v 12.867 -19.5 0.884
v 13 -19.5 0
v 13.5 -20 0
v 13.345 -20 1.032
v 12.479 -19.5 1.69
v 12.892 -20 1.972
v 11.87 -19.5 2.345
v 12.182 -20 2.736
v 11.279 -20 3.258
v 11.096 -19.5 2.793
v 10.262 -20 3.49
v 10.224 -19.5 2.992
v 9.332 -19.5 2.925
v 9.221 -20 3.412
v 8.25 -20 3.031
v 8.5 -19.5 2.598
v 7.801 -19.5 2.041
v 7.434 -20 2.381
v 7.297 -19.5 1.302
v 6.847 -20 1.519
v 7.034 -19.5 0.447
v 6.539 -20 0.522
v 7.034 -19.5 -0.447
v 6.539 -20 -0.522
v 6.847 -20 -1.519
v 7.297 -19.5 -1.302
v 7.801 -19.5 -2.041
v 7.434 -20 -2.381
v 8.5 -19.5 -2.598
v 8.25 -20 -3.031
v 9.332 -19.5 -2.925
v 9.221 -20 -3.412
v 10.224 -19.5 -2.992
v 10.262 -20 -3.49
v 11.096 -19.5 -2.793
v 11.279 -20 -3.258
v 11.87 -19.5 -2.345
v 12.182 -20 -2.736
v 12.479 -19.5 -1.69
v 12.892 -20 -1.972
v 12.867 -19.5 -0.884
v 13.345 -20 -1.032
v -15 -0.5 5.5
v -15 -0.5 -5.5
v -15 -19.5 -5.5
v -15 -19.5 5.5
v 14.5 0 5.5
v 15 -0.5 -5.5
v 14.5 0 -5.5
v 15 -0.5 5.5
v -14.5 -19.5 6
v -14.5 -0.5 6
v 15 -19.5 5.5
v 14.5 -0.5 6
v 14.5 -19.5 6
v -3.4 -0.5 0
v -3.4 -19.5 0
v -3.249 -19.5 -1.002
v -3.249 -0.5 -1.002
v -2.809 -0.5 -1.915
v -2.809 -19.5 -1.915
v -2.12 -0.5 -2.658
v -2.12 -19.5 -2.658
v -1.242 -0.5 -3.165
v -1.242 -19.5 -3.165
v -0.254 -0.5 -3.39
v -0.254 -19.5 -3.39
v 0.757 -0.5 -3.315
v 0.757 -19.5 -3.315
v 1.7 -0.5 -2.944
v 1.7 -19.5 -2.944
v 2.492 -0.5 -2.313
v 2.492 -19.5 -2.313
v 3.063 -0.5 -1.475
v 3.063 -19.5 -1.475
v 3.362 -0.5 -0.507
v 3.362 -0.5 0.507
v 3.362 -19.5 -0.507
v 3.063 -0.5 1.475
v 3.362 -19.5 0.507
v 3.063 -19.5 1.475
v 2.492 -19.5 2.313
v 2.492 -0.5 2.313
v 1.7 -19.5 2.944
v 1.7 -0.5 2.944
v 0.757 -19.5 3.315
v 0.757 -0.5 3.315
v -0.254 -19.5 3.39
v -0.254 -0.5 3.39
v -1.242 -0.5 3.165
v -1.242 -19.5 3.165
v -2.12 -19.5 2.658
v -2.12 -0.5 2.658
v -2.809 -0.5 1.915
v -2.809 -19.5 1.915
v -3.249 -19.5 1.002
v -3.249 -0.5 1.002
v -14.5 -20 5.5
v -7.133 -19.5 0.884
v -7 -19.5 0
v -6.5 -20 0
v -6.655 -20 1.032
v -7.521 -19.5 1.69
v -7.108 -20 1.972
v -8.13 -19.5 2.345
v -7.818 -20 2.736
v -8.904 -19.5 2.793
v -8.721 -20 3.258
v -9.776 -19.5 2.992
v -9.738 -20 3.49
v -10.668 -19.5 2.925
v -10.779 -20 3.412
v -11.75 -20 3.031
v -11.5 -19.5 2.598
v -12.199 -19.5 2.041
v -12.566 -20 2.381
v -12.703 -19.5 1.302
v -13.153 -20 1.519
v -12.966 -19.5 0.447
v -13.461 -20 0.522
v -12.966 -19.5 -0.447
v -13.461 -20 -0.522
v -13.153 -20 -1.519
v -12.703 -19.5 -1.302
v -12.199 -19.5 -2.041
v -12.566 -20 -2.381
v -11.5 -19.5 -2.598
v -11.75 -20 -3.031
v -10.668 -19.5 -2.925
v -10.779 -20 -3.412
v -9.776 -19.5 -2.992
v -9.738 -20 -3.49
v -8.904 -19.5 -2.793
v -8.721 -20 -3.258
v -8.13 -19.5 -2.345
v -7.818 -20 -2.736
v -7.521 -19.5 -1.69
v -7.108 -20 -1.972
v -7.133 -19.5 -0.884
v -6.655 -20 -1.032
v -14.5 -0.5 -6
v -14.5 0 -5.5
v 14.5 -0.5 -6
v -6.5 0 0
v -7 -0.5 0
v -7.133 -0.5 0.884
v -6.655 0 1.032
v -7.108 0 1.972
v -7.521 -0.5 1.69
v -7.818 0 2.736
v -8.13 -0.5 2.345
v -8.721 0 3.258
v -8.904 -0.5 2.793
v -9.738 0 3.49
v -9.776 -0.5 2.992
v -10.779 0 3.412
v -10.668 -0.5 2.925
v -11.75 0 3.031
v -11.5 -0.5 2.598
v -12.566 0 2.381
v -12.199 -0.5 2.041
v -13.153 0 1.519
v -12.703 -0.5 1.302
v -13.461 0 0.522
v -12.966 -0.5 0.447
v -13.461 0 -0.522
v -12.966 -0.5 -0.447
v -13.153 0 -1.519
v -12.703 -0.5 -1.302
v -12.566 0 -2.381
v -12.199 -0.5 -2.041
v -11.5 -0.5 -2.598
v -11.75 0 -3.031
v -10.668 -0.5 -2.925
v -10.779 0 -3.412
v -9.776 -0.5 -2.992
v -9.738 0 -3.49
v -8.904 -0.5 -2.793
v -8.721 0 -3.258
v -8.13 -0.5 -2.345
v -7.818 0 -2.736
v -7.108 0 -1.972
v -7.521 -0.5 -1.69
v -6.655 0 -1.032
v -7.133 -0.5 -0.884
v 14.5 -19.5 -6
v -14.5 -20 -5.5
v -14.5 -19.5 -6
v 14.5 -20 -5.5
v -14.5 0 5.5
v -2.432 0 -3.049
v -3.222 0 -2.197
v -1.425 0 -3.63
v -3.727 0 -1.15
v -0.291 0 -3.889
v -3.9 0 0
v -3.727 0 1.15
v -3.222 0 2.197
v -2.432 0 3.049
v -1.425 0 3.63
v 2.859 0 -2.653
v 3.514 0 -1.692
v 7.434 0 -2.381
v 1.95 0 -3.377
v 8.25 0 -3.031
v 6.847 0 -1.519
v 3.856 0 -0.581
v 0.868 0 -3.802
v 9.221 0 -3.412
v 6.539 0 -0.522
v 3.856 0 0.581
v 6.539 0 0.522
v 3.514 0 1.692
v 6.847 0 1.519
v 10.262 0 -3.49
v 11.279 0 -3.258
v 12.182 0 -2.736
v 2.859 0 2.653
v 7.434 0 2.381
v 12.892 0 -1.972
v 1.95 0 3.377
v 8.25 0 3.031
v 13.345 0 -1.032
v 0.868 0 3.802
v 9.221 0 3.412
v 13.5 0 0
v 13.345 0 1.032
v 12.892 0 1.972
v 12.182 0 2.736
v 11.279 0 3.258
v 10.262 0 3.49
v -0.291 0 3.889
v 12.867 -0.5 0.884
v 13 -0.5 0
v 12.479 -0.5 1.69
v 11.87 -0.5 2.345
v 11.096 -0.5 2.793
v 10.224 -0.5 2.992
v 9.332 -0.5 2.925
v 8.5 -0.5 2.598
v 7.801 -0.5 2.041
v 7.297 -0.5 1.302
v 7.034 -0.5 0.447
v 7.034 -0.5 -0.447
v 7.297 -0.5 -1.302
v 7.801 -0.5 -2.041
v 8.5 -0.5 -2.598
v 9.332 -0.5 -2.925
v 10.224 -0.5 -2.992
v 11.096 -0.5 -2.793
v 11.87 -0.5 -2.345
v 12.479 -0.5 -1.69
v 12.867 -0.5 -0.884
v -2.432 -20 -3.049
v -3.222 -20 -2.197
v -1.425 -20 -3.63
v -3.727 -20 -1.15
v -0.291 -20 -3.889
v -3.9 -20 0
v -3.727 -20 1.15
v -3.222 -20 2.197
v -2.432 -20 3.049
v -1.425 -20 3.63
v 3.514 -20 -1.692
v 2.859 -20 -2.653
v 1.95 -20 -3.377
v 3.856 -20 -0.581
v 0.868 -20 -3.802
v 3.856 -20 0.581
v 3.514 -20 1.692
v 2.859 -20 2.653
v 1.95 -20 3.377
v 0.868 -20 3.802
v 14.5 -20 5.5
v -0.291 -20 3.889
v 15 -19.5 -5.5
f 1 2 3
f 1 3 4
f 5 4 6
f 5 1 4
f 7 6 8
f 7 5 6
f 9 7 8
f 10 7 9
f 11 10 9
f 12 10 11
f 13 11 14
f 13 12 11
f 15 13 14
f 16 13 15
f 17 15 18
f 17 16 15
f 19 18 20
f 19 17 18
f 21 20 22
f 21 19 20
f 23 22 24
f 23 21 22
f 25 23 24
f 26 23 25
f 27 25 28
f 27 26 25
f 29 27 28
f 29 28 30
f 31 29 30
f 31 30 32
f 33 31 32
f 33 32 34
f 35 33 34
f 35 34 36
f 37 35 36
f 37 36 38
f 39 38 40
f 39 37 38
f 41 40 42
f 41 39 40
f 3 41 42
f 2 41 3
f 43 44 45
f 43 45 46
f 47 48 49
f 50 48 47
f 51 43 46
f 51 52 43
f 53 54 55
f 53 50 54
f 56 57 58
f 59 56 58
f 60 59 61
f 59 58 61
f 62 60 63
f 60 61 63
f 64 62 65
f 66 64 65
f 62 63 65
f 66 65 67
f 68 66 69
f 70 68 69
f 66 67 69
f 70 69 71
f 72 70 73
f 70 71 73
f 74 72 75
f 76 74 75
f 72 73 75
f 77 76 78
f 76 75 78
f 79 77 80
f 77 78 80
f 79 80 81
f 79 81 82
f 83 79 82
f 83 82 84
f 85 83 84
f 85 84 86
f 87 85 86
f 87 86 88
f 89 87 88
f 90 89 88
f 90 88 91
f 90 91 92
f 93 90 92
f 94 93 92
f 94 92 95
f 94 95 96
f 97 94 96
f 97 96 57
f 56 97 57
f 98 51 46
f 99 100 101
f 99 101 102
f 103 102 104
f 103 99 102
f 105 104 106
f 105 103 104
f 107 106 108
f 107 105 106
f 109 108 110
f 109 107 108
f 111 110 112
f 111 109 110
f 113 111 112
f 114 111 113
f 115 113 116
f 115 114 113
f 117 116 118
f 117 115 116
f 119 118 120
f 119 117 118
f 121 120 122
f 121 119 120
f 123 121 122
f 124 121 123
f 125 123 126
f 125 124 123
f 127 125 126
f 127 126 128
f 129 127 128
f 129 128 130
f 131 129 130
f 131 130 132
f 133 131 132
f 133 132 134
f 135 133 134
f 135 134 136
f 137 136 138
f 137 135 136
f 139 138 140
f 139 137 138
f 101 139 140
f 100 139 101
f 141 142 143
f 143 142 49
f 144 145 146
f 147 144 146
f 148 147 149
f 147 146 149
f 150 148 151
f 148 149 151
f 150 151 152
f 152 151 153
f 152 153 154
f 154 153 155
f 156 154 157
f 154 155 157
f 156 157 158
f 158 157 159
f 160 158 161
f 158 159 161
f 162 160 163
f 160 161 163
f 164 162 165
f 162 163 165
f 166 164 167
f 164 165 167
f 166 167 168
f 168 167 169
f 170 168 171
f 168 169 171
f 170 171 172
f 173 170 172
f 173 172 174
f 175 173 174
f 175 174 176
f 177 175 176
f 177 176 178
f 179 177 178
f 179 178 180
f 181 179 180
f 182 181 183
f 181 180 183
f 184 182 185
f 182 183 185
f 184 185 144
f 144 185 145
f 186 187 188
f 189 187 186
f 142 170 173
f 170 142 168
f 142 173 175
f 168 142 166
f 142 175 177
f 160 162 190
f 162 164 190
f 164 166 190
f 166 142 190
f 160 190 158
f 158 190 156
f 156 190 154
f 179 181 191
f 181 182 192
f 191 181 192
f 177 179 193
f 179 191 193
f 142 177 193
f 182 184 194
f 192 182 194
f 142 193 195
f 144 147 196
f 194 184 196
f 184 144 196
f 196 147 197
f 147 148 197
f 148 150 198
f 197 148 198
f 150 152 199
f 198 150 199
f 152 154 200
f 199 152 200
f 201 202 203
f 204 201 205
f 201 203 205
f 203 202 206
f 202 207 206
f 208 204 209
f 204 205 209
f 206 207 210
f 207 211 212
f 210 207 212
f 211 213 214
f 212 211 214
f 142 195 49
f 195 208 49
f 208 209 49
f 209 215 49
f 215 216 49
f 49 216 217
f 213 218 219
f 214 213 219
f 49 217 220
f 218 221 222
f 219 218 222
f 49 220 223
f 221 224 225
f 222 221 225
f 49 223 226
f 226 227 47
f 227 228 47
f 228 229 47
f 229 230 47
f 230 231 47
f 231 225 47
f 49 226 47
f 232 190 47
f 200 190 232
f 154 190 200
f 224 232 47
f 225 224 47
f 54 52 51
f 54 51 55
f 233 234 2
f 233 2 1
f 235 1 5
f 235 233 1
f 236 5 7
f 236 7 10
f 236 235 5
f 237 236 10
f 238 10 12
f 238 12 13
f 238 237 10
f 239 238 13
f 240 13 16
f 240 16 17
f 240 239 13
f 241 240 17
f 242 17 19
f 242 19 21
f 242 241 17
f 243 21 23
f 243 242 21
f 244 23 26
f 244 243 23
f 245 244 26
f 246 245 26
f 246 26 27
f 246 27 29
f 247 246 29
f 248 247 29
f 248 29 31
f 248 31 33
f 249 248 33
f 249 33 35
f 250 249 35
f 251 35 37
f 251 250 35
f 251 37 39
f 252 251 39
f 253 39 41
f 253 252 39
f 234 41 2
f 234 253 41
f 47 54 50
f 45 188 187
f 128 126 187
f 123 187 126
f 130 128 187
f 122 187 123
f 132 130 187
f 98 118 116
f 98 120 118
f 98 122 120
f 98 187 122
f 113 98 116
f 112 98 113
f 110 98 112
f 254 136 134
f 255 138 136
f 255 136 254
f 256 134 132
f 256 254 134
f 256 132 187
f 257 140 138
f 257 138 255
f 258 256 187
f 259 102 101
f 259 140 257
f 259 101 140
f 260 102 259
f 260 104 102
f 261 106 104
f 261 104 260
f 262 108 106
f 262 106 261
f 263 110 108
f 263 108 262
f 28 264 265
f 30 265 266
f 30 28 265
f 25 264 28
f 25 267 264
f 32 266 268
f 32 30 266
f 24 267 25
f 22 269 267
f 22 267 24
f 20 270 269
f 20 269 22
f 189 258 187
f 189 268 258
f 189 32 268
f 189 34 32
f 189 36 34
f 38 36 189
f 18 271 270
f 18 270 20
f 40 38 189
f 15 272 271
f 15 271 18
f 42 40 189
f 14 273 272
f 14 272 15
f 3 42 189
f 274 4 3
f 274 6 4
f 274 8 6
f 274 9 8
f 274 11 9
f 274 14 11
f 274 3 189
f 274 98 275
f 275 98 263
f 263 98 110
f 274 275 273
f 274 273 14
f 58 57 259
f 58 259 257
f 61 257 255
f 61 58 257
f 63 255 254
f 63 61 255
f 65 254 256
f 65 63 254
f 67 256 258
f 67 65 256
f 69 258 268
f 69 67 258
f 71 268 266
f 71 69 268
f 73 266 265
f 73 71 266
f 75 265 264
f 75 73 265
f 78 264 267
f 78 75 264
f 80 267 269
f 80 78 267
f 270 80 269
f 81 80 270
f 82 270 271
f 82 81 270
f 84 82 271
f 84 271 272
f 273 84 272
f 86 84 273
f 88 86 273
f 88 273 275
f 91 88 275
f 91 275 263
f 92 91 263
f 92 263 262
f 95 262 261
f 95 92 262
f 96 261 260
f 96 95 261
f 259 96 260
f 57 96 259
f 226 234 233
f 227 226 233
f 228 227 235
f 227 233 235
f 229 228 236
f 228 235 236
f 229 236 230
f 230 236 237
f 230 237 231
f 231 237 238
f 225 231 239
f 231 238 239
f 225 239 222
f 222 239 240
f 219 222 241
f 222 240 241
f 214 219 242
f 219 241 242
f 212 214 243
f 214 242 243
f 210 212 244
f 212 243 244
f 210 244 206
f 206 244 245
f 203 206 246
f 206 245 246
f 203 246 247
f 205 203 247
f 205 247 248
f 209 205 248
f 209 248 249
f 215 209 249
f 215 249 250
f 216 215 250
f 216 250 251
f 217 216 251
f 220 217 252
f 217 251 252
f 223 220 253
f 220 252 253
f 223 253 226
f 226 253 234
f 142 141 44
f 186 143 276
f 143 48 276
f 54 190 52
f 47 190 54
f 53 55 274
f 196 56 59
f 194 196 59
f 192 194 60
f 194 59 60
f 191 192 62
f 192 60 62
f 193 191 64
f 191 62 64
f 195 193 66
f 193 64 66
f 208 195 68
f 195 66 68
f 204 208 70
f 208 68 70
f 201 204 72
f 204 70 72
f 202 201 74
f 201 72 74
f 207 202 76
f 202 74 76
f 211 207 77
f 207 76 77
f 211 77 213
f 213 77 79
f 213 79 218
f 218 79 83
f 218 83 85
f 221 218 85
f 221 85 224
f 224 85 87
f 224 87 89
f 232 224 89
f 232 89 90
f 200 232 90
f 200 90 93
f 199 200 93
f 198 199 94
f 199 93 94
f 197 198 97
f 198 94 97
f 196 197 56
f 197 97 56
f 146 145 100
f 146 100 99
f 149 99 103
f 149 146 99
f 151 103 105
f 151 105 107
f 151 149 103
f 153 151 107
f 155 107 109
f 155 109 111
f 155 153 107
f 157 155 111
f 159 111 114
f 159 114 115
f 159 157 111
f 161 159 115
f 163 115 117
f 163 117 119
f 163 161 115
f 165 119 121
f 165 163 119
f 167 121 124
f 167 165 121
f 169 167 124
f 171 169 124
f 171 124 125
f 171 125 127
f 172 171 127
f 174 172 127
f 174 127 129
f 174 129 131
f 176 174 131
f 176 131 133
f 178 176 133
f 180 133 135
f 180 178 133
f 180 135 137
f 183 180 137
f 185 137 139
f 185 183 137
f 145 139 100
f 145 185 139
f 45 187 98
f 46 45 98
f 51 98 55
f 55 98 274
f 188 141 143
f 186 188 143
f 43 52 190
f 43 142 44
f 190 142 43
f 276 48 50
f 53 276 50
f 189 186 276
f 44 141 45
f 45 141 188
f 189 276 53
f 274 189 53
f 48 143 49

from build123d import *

# Parameters (mm, degrees)
F0_W     = 30
F0_H     = 12
F0_R     = 3
F0_R_2   = 3.4
F1_DEPTH = 20
F2_D     = 6.8
F2_DEPTH = 23.75
F2_TIP   = 2.0429261047
F3_SIZE  = 0.5


with BuildPart() as f1:
    # F0 (on Front) → F1 (new body)
    with BuildSketch(Plane.XZ):
        Rectangle(F0_W, F0_H)
        with Locations((-10, 0)):
            Circle(F0_R, mode=Mode.SUBTRACT)
        Circle(F0_R_2, mode=Mode.SUBTRACT)
        with Locations((10, 0)):
            Circle(F0_R, mode=Mode.SUBTRACT)
        Circle(F0_R_2)
    extrude(amount=F1_DEPTH)

    # F2
    with Locations(Plane(origin=(0, 0, 0), x_dir=(1, 0, 0), z_dir=(0, 1, 0))):
        with Locations((0, 0)):
            Hole(F2_D / 2, depth=F2_DEPTH)
            with Locations((0, 0, -(F2_DEPTH + F2_TIP / 2))):  # 118° drill point
                Cone(0, F2_D / 2, F2_TIP, mode=Mode.SUBTRACT)

    # F3
    f3_edges = [f1.edges().sort_by_distance(p)[0] for p in [
        (15, -10, 6),
        (-15, -10, 6),
        (0, 0, 6),
        (0, -20, 6),
        (-15, -10, -6),
        (15, -10, -6),
        (0, 0, -6),
        (0, -20, -6),
        (-15, 0, 0),
        (-15, -20, 0),
        (15, 0, 0),
        (15, -20, 0),
        (-7, -10, 0),
        (-13, 0, 0),
        (-13, -20, 0),
        (-3.4, 0, 0),
        (3.4, -10, 0),
        (-3.4, -20, 0),
        (13, -10, 0),
        (7, 0, 0),
        (7, -20, 0),
    ]]
    chamfer(f3_edges, length=F3_SIZE)


solid = f1.part
